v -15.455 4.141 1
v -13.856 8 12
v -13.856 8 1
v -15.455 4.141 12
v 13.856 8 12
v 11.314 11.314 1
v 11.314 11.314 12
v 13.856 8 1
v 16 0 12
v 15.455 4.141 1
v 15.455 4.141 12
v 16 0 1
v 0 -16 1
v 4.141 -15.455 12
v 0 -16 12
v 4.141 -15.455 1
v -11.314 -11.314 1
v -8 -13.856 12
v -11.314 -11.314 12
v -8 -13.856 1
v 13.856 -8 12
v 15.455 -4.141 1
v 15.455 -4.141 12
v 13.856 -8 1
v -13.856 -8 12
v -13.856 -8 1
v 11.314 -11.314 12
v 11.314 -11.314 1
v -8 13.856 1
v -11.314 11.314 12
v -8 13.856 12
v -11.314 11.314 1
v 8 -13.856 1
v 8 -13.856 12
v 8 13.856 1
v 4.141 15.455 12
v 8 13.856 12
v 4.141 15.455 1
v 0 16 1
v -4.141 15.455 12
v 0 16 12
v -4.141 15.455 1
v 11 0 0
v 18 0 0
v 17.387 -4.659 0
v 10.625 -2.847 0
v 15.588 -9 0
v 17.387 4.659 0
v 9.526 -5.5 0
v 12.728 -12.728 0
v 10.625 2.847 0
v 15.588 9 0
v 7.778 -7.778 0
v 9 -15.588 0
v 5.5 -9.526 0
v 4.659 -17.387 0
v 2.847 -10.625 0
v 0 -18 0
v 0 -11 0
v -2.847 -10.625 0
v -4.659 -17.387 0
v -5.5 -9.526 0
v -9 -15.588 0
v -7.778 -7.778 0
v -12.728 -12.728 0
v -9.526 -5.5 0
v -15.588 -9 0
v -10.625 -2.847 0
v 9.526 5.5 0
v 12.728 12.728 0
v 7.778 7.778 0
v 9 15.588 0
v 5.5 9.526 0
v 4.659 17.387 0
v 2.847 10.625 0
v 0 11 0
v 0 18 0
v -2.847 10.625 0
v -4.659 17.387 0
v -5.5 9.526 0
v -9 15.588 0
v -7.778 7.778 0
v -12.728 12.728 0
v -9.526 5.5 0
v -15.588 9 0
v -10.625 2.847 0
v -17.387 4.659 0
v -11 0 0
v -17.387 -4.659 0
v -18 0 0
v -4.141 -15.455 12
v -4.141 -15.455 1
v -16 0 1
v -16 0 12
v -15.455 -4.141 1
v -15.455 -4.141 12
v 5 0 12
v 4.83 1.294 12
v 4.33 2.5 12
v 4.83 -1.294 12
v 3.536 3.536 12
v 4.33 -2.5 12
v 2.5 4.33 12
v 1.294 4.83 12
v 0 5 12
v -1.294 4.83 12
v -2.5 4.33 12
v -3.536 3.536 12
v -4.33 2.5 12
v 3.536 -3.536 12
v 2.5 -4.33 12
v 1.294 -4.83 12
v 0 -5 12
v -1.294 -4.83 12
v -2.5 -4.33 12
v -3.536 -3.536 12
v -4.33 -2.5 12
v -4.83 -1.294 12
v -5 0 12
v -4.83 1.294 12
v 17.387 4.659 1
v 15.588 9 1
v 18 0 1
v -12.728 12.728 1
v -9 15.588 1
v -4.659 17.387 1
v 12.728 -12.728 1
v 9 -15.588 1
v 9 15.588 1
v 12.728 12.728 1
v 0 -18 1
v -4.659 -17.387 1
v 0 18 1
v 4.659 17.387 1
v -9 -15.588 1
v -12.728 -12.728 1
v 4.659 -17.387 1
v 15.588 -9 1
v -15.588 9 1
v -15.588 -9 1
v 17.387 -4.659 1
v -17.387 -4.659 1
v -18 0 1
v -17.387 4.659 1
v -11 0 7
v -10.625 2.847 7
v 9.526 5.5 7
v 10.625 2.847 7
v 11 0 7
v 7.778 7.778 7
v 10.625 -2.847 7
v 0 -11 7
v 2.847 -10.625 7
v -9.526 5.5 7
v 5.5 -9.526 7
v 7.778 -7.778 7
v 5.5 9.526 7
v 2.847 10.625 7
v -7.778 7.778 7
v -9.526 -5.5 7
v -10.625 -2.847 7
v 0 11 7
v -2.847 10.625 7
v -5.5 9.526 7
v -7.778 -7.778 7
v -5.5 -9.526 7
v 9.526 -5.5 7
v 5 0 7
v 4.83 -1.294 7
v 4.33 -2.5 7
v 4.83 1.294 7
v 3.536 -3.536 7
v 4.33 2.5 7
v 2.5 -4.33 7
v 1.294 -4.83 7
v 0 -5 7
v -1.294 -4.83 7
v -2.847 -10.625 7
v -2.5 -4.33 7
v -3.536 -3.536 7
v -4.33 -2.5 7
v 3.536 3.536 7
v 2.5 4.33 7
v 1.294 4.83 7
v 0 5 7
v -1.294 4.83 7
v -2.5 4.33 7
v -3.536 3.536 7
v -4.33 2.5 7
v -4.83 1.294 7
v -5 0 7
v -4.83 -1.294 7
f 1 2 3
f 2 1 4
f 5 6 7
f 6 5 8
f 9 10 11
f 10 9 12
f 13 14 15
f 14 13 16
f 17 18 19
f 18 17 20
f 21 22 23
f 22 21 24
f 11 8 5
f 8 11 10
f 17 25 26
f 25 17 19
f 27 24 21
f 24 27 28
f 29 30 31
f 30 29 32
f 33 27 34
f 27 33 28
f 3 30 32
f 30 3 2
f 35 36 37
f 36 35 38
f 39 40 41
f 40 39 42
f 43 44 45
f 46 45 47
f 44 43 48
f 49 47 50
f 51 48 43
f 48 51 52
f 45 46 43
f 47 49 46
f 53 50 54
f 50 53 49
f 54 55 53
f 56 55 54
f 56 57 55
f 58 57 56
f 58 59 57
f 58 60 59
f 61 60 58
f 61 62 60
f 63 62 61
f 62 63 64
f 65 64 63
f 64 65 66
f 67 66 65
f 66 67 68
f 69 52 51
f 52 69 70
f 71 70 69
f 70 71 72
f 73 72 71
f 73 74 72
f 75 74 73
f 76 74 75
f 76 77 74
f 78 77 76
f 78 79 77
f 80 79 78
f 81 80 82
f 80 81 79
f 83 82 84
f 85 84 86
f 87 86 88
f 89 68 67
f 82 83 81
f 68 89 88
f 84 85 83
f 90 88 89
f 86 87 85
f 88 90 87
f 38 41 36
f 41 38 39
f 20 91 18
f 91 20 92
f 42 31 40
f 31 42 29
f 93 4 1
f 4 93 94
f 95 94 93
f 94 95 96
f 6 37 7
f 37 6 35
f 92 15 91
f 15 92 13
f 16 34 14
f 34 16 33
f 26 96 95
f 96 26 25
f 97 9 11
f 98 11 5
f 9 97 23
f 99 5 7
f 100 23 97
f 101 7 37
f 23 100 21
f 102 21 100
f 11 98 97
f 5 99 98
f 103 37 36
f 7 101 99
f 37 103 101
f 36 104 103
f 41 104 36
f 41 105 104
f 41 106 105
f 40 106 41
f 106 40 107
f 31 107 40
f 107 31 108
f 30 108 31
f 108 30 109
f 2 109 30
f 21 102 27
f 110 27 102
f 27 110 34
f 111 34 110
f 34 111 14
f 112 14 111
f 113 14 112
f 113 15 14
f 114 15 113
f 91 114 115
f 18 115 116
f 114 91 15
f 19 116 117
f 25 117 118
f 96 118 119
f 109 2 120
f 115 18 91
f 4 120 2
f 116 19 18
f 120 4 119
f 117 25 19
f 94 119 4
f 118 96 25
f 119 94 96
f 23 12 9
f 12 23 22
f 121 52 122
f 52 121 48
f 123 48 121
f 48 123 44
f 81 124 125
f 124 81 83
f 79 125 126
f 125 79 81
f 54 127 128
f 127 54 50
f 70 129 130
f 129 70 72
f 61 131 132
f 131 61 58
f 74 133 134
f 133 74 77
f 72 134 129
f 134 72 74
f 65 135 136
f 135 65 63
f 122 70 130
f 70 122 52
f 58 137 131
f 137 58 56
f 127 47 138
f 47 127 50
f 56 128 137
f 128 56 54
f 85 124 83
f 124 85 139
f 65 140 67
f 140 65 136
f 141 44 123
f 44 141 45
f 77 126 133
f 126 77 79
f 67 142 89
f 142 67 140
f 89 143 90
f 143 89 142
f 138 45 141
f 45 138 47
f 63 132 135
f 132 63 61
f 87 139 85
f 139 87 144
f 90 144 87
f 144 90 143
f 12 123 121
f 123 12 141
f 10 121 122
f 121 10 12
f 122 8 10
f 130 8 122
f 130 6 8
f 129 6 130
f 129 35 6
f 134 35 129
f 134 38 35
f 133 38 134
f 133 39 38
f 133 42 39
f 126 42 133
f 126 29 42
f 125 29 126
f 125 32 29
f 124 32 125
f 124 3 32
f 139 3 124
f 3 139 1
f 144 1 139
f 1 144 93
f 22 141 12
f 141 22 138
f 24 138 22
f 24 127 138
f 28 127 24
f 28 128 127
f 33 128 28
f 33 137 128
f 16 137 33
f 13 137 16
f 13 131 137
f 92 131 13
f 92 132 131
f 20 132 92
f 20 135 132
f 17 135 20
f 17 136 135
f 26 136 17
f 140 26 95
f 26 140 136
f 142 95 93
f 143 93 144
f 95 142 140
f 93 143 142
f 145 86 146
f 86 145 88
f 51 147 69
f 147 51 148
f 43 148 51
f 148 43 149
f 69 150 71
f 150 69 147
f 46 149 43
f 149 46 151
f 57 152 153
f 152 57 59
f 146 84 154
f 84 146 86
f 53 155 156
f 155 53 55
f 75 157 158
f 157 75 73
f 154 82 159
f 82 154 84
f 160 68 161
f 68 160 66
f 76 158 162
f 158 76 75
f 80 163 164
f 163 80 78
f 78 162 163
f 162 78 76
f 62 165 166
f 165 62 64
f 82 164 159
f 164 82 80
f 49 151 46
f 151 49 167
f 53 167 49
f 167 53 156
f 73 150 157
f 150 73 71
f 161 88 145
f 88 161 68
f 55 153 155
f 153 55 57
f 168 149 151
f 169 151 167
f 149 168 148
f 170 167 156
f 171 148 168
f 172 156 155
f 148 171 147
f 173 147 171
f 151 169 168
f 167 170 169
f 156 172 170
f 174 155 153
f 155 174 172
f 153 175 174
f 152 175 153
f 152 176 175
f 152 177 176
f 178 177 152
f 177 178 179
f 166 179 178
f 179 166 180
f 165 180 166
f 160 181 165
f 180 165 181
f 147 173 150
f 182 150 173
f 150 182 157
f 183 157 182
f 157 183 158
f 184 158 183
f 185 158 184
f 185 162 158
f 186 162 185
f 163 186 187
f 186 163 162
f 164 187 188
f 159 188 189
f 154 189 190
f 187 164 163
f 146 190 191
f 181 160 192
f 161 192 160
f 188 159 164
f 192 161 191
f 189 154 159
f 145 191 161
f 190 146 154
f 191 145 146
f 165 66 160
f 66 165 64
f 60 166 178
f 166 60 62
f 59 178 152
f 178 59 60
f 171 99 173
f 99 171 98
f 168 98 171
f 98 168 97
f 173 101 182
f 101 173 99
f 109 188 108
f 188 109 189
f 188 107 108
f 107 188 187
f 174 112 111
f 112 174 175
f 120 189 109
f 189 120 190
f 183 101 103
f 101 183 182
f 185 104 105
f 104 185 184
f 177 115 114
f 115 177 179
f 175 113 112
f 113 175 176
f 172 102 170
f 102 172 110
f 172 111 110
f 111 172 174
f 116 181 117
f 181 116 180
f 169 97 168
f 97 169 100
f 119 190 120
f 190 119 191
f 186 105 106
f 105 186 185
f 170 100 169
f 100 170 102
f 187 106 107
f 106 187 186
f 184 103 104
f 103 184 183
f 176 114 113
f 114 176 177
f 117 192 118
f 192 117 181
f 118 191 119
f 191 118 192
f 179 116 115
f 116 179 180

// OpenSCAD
difference()
{
	union()
	{
		cylinder(r=32/2,h=12,$fn=24);
		cylinder(r=36/2,h=1,$fn=24);
	}
	cylinder(r=22/2,h=7,$fn=24);
	cylinder(r=10/2,h=20,$fn=24);
}
